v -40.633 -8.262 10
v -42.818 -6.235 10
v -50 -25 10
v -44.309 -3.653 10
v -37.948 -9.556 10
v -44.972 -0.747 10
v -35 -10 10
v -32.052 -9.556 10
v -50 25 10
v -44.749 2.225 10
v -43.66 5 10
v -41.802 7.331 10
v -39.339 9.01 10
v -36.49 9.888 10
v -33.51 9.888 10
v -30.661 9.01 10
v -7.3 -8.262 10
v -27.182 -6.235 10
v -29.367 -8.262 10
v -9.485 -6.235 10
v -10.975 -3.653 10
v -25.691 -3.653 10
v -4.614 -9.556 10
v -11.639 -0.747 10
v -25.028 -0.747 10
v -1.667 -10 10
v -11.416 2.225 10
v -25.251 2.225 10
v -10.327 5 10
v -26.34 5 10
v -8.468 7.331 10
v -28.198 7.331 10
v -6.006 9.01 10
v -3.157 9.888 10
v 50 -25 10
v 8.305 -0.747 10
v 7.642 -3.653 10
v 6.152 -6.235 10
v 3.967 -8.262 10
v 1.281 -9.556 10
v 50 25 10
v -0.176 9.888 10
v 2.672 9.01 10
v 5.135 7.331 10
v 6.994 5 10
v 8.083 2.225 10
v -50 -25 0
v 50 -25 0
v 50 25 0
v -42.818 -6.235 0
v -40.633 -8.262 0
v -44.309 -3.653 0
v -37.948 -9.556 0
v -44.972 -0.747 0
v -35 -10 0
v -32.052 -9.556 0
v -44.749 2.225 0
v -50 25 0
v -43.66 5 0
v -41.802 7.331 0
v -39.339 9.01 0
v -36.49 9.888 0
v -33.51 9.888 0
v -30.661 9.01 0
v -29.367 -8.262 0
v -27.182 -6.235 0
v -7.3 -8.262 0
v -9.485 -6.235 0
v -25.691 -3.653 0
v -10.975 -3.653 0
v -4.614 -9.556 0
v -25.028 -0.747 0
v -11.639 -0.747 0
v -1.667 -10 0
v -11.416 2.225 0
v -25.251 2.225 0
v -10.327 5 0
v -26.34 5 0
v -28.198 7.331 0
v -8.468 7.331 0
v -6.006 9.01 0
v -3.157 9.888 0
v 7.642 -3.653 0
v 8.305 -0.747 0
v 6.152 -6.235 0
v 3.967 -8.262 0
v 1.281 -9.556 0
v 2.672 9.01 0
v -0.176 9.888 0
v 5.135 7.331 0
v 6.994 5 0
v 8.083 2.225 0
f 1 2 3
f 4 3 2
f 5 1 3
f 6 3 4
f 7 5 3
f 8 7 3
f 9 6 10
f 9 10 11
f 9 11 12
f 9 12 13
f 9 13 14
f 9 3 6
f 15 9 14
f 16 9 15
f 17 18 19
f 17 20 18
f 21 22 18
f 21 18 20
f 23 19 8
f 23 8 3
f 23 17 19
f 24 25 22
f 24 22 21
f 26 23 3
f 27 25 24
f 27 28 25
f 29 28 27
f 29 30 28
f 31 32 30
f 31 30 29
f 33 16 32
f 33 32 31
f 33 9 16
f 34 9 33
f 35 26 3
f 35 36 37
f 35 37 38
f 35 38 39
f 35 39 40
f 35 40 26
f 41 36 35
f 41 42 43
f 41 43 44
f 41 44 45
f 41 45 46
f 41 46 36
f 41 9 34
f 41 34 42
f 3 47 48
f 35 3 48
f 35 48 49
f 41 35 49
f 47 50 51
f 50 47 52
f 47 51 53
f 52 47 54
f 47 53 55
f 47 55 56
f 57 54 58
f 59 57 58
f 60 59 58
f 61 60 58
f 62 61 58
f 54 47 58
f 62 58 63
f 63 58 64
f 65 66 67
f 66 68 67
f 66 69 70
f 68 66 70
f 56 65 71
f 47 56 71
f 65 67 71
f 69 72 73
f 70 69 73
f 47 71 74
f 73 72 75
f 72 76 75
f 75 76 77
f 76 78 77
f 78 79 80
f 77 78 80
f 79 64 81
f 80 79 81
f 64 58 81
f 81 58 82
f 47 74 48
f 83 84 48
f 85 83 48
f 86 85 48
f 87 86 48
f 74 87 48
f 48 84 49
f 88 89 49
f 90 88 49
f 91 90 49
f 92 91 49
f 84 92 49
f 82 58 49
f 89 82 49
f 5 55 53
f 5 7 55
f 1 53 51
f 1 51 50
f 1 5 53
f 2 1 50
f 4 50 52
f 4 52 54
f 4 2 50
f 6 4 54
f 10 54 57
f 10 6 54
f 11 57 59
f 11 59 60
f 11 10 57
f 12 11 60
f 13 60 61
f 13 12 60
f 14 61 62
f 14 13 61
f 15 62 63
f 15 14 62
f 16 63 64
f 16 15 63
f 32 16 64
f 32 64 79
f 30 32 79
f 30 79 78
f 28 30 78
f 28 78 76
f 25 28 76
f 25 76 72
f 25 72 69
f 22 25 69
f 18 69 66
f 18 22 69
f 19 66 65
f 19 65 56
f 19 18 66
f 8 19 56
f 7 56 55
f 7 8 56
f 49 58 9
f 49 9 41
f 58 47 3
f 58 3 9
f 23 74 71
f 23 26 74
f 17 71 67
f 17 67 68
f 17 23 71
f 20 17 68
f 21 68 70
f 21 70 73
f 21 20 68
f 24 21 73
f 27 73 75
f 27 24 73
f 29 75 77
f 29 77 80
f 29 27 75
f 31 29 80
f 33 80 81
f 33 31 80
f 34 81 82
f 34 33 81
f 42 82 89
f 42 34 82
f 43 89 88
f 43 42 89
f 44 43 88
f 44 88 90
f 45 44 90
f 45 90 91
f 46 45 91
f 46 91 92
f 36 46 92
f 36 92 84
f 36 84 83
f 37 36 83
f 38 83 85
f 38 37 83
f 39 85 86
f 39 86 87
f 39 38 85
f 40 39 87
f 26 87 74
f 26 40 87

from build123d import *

# Parameters (mm, degrees)
SKETCH1_W           = 100
SKETCH1_H           = 50
BOSS_EXTRUDE1_DEPTH = 10
LPATTERN1_COUNT     = 2
LPATTERN1_PITCH     = 33.333333333


with BuildPart() as part:
    # Sketch1 → Boss-Extrude1 (new body)
    with BuildSketch(Plane.XY):
        Rectangle(SKETCH1_W, SKETCH1_H)
    extrude(amount=BOSS_EXTRUDE1_DEPTH)

    # Sketch2 → Ø20.0mm Dowel Slot1 (revolve, cut)
    with BuildSketch(Plane(origin=(-35, 0, 10), x_dir=(0, -1, 0), z_dir=(1, 0, 0))):
        Polygon((0, 0), (0, 16.00860619), (10, 10), (10, 0), align=None)
    f_20_0mm_dowel_slot1 = revolve(axis=Axis((-35, 0, 16.35), (0, 0, -1)), mode=Mode.SUBTRACT)

    # LPattern1: Ø20.0mm Dowel Slot1 ×2
    with Locations(*[(i * LPATTERN1_PITCH, 0, 0) for i in range(1, LPATTERN1_COUNT)]):
        add(f_20_0mm_dowel_slot1, mode=Mode.SUBTRACT)


solid = part.part
